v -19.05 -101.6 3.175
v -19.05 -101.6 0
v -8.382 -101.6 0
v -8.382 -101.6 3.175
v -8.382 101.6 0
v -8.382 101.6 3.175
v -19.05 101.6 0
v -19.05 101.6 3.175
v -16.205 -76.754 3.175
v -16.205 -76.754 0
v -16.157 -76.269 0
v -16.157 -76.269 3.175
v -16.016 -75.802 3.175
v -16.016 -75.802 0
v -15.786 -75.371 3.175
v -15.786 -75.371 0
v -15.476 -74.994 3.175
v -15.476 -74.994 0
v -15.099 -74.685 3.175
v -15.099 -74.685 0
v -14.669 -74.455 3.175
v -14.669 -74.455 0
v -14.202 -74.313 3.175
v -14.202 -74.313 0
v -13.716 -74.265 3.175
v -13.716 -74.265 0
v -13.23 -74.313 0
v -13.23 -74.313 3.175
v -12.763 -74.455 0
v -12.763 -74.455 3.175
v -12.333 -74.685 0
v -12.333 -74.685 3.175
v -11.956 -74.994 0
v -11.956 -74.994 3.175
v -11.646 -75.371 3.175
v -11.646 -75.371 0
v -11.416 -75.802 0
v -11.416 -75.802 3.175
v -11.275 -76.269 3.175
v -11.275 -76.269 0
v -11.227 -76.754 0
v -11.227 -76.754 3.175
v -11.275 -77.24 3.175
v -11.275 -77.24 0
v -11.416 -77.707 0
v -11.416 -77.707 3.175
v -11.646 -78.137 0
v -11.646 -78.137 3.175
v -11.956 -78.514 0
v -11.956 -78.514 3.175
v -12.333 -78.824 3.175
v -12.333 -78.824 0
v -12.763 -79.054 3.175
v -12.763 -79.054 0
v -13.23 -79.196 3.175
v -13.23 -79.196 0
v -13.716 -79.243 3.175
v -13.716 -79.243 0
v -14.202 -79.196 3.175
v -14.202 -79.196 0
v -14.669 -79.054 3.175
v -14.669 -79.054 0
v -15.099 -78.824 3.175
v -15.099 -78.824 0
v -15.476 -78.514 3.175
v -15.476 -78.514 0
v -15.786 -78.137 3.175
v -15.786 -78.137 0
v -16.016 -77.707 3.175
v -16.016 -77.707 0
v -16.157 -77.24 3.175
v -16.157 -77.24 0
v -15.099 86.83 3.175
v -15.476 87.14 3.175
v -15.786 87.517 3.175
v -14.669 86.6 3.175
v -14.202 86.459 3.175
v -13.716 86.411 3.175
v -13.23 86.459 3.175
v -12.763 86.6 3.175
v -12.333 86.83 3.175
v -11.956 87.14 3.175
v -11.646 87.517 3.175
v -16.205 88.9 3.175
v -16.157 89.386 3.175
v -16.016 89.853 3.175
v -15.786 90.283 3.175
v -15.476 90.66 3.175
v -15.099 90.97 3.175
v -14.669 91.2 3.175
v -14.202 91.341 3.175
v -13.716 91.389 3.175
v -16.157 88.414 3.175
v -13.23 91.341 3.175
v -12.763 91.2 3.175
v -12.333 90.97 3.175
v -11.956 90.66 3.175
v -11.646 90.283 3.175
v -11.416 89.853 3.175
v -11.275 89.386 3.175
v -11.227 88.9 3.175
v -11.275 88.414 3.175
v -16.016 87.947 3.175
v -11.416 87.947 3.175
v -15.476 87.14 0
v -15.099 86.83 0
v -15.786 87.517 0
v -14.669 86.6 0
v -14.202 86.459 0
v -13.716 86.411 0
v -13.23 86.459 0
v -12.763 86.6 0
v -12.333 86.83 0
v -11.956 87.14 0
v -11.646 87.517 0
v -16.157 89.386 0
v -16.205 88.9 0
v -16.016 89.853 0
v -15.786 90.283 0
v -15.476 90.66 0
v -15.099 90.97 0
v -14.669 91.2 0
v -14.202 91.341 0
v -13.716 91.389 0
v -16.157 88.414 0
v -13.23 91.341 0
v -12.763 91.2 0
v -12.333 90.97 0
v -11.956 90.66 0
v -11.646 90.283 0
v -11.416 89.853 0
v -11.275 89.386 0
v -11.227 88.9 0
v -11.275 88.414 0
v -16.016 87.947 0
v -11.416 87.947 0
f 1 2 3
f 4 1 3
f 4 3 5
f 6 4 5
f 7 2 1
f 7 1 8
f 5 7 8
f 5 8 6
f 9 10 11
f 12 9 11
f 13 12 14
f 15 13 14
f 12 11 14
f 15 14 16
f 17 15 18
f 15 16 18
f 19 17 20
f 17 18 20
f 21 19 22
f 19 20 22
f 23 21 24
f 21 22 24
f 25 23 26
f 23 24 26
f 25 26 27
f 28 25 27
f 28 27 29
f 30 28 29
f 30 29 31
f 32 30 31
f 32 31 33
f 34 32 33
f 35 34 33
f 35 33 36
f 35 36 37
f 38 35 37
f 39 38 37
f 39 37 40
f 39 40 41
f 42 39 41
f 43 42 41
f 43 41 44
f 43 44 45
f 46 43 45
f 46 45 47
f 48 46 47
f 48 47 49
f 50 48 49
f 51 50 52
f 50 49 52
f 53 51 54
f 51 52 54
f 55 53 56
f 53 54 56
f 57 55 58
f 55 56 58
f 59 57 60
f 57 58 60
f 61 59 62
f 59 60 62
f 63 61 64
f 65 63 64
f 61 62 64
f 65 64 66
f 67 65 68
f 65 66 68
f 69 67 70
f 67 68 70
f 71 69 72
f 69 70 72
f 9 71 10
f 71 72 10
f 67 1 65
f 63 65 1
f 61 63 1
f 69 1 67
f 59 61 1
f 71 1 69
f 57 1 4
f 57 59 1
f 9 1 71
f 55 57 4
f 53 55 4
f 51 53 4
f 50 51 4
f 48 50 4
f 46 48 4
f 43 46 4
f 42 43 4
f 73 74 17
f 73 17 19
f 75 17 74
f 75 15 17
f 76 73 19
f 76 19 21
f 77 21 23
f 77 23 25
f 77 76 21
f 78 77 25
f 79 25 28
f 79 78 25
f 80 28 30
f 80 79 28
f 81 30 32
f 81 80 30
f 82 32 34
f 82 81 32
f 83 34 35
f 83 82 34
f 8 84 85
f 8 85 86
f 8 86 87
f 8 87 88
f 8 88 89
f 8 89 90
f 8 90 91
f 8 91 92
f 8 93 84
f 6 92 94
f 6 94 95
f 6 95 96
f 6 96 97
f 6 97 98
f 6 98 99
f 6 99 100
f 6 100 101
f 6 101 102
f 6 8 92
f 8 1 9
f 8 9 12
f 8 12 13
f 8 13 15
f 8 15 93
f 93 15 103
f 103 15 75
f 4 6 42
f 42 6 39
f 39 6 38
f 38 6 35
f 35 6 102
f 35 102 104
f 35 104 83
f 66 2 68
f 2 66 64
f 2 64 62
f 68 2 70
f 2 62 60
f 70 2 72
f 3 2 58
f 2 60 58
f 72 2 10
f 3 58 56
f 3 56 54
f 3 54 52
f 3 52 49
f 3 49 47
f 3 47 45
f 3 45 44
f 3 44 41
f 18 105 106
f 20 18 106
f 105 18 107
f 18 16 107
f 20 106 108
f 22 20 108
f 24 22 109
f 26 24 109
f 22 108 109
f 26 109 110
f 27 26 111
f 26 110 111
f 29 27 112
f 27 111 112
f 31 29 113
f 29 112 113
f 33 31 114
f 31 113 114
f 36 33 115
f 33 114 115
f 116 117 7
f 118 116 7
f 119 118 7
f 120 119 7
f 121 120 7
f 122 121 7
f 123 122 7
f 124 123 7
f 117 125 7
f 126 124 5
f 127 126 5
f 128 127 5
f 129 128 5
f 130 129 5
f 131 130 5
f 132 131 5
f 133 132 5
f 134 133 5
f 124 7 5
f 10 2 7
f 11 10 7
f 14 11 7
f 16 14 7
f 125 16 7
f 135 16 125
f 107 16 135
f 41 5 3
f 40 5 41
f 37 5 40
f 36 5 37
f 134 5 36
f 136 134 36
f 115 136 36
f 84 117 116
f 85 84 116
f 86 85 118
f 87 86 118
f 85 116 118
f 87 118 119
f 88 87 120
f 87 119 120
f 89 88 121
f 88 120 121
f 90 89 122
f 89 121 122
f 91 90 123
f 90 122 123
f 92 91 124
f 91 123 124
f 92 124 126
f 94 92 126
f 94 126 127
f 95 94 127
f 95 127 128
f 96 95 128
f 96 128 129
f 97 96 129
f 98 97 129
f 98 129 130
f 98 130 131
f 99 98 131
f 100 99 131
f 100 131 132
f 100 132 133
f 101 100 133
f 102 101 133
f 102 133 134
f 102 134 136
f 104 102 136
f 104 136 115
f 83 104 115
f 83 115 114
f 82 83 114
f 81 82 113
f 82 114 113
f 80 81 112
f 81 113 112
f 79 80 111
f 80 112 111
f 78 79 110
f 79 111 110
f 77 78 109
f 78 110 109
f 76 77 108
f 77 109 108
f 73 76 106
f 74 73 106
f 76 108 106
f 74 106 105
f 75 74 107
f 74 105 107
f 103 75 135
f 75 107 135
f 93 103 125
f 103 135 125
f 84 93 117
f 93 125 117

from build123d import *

# Parameters (mm, degrees)
SKETCH1_W              = 10.668
SKETCH1_H              = 203.2
BOSS_EXTRUDE1_DEPTH    = 3.175
F_10_CLEARANCE_HOLE1_D = 4.9784
F_10_CLEARANCE_HOLE2_D = 4.9784


with BuildPart() as part:
    # Sketch1 → Boss-Extrude1 (new body)
    with BuildSketch(Plane.XY):
        with Locations((-13.716, 0)):
            Rectangle(SKETCH1_W, SKETCH1_H)
    extrude(amount=BOSS_EXTRUDE1_DEPTH)

    # #10 Clearance Hole1 (through all)
    with Locations(Plane.XY.offset(3.175)):
        with Locations((-13.716, -76.754256991)):
            Hole(F_10_CLEARANCE_HOLE1_D / 2)

    # #10 Clearance Hole2 (through all)
    with Locations(Plane.XY.offset(3.175)):
        with Locations((-13.716, 88.9)):
            Hole(F_10_CLEARANCE_HOLE2_D / 2)


solid = part.part
